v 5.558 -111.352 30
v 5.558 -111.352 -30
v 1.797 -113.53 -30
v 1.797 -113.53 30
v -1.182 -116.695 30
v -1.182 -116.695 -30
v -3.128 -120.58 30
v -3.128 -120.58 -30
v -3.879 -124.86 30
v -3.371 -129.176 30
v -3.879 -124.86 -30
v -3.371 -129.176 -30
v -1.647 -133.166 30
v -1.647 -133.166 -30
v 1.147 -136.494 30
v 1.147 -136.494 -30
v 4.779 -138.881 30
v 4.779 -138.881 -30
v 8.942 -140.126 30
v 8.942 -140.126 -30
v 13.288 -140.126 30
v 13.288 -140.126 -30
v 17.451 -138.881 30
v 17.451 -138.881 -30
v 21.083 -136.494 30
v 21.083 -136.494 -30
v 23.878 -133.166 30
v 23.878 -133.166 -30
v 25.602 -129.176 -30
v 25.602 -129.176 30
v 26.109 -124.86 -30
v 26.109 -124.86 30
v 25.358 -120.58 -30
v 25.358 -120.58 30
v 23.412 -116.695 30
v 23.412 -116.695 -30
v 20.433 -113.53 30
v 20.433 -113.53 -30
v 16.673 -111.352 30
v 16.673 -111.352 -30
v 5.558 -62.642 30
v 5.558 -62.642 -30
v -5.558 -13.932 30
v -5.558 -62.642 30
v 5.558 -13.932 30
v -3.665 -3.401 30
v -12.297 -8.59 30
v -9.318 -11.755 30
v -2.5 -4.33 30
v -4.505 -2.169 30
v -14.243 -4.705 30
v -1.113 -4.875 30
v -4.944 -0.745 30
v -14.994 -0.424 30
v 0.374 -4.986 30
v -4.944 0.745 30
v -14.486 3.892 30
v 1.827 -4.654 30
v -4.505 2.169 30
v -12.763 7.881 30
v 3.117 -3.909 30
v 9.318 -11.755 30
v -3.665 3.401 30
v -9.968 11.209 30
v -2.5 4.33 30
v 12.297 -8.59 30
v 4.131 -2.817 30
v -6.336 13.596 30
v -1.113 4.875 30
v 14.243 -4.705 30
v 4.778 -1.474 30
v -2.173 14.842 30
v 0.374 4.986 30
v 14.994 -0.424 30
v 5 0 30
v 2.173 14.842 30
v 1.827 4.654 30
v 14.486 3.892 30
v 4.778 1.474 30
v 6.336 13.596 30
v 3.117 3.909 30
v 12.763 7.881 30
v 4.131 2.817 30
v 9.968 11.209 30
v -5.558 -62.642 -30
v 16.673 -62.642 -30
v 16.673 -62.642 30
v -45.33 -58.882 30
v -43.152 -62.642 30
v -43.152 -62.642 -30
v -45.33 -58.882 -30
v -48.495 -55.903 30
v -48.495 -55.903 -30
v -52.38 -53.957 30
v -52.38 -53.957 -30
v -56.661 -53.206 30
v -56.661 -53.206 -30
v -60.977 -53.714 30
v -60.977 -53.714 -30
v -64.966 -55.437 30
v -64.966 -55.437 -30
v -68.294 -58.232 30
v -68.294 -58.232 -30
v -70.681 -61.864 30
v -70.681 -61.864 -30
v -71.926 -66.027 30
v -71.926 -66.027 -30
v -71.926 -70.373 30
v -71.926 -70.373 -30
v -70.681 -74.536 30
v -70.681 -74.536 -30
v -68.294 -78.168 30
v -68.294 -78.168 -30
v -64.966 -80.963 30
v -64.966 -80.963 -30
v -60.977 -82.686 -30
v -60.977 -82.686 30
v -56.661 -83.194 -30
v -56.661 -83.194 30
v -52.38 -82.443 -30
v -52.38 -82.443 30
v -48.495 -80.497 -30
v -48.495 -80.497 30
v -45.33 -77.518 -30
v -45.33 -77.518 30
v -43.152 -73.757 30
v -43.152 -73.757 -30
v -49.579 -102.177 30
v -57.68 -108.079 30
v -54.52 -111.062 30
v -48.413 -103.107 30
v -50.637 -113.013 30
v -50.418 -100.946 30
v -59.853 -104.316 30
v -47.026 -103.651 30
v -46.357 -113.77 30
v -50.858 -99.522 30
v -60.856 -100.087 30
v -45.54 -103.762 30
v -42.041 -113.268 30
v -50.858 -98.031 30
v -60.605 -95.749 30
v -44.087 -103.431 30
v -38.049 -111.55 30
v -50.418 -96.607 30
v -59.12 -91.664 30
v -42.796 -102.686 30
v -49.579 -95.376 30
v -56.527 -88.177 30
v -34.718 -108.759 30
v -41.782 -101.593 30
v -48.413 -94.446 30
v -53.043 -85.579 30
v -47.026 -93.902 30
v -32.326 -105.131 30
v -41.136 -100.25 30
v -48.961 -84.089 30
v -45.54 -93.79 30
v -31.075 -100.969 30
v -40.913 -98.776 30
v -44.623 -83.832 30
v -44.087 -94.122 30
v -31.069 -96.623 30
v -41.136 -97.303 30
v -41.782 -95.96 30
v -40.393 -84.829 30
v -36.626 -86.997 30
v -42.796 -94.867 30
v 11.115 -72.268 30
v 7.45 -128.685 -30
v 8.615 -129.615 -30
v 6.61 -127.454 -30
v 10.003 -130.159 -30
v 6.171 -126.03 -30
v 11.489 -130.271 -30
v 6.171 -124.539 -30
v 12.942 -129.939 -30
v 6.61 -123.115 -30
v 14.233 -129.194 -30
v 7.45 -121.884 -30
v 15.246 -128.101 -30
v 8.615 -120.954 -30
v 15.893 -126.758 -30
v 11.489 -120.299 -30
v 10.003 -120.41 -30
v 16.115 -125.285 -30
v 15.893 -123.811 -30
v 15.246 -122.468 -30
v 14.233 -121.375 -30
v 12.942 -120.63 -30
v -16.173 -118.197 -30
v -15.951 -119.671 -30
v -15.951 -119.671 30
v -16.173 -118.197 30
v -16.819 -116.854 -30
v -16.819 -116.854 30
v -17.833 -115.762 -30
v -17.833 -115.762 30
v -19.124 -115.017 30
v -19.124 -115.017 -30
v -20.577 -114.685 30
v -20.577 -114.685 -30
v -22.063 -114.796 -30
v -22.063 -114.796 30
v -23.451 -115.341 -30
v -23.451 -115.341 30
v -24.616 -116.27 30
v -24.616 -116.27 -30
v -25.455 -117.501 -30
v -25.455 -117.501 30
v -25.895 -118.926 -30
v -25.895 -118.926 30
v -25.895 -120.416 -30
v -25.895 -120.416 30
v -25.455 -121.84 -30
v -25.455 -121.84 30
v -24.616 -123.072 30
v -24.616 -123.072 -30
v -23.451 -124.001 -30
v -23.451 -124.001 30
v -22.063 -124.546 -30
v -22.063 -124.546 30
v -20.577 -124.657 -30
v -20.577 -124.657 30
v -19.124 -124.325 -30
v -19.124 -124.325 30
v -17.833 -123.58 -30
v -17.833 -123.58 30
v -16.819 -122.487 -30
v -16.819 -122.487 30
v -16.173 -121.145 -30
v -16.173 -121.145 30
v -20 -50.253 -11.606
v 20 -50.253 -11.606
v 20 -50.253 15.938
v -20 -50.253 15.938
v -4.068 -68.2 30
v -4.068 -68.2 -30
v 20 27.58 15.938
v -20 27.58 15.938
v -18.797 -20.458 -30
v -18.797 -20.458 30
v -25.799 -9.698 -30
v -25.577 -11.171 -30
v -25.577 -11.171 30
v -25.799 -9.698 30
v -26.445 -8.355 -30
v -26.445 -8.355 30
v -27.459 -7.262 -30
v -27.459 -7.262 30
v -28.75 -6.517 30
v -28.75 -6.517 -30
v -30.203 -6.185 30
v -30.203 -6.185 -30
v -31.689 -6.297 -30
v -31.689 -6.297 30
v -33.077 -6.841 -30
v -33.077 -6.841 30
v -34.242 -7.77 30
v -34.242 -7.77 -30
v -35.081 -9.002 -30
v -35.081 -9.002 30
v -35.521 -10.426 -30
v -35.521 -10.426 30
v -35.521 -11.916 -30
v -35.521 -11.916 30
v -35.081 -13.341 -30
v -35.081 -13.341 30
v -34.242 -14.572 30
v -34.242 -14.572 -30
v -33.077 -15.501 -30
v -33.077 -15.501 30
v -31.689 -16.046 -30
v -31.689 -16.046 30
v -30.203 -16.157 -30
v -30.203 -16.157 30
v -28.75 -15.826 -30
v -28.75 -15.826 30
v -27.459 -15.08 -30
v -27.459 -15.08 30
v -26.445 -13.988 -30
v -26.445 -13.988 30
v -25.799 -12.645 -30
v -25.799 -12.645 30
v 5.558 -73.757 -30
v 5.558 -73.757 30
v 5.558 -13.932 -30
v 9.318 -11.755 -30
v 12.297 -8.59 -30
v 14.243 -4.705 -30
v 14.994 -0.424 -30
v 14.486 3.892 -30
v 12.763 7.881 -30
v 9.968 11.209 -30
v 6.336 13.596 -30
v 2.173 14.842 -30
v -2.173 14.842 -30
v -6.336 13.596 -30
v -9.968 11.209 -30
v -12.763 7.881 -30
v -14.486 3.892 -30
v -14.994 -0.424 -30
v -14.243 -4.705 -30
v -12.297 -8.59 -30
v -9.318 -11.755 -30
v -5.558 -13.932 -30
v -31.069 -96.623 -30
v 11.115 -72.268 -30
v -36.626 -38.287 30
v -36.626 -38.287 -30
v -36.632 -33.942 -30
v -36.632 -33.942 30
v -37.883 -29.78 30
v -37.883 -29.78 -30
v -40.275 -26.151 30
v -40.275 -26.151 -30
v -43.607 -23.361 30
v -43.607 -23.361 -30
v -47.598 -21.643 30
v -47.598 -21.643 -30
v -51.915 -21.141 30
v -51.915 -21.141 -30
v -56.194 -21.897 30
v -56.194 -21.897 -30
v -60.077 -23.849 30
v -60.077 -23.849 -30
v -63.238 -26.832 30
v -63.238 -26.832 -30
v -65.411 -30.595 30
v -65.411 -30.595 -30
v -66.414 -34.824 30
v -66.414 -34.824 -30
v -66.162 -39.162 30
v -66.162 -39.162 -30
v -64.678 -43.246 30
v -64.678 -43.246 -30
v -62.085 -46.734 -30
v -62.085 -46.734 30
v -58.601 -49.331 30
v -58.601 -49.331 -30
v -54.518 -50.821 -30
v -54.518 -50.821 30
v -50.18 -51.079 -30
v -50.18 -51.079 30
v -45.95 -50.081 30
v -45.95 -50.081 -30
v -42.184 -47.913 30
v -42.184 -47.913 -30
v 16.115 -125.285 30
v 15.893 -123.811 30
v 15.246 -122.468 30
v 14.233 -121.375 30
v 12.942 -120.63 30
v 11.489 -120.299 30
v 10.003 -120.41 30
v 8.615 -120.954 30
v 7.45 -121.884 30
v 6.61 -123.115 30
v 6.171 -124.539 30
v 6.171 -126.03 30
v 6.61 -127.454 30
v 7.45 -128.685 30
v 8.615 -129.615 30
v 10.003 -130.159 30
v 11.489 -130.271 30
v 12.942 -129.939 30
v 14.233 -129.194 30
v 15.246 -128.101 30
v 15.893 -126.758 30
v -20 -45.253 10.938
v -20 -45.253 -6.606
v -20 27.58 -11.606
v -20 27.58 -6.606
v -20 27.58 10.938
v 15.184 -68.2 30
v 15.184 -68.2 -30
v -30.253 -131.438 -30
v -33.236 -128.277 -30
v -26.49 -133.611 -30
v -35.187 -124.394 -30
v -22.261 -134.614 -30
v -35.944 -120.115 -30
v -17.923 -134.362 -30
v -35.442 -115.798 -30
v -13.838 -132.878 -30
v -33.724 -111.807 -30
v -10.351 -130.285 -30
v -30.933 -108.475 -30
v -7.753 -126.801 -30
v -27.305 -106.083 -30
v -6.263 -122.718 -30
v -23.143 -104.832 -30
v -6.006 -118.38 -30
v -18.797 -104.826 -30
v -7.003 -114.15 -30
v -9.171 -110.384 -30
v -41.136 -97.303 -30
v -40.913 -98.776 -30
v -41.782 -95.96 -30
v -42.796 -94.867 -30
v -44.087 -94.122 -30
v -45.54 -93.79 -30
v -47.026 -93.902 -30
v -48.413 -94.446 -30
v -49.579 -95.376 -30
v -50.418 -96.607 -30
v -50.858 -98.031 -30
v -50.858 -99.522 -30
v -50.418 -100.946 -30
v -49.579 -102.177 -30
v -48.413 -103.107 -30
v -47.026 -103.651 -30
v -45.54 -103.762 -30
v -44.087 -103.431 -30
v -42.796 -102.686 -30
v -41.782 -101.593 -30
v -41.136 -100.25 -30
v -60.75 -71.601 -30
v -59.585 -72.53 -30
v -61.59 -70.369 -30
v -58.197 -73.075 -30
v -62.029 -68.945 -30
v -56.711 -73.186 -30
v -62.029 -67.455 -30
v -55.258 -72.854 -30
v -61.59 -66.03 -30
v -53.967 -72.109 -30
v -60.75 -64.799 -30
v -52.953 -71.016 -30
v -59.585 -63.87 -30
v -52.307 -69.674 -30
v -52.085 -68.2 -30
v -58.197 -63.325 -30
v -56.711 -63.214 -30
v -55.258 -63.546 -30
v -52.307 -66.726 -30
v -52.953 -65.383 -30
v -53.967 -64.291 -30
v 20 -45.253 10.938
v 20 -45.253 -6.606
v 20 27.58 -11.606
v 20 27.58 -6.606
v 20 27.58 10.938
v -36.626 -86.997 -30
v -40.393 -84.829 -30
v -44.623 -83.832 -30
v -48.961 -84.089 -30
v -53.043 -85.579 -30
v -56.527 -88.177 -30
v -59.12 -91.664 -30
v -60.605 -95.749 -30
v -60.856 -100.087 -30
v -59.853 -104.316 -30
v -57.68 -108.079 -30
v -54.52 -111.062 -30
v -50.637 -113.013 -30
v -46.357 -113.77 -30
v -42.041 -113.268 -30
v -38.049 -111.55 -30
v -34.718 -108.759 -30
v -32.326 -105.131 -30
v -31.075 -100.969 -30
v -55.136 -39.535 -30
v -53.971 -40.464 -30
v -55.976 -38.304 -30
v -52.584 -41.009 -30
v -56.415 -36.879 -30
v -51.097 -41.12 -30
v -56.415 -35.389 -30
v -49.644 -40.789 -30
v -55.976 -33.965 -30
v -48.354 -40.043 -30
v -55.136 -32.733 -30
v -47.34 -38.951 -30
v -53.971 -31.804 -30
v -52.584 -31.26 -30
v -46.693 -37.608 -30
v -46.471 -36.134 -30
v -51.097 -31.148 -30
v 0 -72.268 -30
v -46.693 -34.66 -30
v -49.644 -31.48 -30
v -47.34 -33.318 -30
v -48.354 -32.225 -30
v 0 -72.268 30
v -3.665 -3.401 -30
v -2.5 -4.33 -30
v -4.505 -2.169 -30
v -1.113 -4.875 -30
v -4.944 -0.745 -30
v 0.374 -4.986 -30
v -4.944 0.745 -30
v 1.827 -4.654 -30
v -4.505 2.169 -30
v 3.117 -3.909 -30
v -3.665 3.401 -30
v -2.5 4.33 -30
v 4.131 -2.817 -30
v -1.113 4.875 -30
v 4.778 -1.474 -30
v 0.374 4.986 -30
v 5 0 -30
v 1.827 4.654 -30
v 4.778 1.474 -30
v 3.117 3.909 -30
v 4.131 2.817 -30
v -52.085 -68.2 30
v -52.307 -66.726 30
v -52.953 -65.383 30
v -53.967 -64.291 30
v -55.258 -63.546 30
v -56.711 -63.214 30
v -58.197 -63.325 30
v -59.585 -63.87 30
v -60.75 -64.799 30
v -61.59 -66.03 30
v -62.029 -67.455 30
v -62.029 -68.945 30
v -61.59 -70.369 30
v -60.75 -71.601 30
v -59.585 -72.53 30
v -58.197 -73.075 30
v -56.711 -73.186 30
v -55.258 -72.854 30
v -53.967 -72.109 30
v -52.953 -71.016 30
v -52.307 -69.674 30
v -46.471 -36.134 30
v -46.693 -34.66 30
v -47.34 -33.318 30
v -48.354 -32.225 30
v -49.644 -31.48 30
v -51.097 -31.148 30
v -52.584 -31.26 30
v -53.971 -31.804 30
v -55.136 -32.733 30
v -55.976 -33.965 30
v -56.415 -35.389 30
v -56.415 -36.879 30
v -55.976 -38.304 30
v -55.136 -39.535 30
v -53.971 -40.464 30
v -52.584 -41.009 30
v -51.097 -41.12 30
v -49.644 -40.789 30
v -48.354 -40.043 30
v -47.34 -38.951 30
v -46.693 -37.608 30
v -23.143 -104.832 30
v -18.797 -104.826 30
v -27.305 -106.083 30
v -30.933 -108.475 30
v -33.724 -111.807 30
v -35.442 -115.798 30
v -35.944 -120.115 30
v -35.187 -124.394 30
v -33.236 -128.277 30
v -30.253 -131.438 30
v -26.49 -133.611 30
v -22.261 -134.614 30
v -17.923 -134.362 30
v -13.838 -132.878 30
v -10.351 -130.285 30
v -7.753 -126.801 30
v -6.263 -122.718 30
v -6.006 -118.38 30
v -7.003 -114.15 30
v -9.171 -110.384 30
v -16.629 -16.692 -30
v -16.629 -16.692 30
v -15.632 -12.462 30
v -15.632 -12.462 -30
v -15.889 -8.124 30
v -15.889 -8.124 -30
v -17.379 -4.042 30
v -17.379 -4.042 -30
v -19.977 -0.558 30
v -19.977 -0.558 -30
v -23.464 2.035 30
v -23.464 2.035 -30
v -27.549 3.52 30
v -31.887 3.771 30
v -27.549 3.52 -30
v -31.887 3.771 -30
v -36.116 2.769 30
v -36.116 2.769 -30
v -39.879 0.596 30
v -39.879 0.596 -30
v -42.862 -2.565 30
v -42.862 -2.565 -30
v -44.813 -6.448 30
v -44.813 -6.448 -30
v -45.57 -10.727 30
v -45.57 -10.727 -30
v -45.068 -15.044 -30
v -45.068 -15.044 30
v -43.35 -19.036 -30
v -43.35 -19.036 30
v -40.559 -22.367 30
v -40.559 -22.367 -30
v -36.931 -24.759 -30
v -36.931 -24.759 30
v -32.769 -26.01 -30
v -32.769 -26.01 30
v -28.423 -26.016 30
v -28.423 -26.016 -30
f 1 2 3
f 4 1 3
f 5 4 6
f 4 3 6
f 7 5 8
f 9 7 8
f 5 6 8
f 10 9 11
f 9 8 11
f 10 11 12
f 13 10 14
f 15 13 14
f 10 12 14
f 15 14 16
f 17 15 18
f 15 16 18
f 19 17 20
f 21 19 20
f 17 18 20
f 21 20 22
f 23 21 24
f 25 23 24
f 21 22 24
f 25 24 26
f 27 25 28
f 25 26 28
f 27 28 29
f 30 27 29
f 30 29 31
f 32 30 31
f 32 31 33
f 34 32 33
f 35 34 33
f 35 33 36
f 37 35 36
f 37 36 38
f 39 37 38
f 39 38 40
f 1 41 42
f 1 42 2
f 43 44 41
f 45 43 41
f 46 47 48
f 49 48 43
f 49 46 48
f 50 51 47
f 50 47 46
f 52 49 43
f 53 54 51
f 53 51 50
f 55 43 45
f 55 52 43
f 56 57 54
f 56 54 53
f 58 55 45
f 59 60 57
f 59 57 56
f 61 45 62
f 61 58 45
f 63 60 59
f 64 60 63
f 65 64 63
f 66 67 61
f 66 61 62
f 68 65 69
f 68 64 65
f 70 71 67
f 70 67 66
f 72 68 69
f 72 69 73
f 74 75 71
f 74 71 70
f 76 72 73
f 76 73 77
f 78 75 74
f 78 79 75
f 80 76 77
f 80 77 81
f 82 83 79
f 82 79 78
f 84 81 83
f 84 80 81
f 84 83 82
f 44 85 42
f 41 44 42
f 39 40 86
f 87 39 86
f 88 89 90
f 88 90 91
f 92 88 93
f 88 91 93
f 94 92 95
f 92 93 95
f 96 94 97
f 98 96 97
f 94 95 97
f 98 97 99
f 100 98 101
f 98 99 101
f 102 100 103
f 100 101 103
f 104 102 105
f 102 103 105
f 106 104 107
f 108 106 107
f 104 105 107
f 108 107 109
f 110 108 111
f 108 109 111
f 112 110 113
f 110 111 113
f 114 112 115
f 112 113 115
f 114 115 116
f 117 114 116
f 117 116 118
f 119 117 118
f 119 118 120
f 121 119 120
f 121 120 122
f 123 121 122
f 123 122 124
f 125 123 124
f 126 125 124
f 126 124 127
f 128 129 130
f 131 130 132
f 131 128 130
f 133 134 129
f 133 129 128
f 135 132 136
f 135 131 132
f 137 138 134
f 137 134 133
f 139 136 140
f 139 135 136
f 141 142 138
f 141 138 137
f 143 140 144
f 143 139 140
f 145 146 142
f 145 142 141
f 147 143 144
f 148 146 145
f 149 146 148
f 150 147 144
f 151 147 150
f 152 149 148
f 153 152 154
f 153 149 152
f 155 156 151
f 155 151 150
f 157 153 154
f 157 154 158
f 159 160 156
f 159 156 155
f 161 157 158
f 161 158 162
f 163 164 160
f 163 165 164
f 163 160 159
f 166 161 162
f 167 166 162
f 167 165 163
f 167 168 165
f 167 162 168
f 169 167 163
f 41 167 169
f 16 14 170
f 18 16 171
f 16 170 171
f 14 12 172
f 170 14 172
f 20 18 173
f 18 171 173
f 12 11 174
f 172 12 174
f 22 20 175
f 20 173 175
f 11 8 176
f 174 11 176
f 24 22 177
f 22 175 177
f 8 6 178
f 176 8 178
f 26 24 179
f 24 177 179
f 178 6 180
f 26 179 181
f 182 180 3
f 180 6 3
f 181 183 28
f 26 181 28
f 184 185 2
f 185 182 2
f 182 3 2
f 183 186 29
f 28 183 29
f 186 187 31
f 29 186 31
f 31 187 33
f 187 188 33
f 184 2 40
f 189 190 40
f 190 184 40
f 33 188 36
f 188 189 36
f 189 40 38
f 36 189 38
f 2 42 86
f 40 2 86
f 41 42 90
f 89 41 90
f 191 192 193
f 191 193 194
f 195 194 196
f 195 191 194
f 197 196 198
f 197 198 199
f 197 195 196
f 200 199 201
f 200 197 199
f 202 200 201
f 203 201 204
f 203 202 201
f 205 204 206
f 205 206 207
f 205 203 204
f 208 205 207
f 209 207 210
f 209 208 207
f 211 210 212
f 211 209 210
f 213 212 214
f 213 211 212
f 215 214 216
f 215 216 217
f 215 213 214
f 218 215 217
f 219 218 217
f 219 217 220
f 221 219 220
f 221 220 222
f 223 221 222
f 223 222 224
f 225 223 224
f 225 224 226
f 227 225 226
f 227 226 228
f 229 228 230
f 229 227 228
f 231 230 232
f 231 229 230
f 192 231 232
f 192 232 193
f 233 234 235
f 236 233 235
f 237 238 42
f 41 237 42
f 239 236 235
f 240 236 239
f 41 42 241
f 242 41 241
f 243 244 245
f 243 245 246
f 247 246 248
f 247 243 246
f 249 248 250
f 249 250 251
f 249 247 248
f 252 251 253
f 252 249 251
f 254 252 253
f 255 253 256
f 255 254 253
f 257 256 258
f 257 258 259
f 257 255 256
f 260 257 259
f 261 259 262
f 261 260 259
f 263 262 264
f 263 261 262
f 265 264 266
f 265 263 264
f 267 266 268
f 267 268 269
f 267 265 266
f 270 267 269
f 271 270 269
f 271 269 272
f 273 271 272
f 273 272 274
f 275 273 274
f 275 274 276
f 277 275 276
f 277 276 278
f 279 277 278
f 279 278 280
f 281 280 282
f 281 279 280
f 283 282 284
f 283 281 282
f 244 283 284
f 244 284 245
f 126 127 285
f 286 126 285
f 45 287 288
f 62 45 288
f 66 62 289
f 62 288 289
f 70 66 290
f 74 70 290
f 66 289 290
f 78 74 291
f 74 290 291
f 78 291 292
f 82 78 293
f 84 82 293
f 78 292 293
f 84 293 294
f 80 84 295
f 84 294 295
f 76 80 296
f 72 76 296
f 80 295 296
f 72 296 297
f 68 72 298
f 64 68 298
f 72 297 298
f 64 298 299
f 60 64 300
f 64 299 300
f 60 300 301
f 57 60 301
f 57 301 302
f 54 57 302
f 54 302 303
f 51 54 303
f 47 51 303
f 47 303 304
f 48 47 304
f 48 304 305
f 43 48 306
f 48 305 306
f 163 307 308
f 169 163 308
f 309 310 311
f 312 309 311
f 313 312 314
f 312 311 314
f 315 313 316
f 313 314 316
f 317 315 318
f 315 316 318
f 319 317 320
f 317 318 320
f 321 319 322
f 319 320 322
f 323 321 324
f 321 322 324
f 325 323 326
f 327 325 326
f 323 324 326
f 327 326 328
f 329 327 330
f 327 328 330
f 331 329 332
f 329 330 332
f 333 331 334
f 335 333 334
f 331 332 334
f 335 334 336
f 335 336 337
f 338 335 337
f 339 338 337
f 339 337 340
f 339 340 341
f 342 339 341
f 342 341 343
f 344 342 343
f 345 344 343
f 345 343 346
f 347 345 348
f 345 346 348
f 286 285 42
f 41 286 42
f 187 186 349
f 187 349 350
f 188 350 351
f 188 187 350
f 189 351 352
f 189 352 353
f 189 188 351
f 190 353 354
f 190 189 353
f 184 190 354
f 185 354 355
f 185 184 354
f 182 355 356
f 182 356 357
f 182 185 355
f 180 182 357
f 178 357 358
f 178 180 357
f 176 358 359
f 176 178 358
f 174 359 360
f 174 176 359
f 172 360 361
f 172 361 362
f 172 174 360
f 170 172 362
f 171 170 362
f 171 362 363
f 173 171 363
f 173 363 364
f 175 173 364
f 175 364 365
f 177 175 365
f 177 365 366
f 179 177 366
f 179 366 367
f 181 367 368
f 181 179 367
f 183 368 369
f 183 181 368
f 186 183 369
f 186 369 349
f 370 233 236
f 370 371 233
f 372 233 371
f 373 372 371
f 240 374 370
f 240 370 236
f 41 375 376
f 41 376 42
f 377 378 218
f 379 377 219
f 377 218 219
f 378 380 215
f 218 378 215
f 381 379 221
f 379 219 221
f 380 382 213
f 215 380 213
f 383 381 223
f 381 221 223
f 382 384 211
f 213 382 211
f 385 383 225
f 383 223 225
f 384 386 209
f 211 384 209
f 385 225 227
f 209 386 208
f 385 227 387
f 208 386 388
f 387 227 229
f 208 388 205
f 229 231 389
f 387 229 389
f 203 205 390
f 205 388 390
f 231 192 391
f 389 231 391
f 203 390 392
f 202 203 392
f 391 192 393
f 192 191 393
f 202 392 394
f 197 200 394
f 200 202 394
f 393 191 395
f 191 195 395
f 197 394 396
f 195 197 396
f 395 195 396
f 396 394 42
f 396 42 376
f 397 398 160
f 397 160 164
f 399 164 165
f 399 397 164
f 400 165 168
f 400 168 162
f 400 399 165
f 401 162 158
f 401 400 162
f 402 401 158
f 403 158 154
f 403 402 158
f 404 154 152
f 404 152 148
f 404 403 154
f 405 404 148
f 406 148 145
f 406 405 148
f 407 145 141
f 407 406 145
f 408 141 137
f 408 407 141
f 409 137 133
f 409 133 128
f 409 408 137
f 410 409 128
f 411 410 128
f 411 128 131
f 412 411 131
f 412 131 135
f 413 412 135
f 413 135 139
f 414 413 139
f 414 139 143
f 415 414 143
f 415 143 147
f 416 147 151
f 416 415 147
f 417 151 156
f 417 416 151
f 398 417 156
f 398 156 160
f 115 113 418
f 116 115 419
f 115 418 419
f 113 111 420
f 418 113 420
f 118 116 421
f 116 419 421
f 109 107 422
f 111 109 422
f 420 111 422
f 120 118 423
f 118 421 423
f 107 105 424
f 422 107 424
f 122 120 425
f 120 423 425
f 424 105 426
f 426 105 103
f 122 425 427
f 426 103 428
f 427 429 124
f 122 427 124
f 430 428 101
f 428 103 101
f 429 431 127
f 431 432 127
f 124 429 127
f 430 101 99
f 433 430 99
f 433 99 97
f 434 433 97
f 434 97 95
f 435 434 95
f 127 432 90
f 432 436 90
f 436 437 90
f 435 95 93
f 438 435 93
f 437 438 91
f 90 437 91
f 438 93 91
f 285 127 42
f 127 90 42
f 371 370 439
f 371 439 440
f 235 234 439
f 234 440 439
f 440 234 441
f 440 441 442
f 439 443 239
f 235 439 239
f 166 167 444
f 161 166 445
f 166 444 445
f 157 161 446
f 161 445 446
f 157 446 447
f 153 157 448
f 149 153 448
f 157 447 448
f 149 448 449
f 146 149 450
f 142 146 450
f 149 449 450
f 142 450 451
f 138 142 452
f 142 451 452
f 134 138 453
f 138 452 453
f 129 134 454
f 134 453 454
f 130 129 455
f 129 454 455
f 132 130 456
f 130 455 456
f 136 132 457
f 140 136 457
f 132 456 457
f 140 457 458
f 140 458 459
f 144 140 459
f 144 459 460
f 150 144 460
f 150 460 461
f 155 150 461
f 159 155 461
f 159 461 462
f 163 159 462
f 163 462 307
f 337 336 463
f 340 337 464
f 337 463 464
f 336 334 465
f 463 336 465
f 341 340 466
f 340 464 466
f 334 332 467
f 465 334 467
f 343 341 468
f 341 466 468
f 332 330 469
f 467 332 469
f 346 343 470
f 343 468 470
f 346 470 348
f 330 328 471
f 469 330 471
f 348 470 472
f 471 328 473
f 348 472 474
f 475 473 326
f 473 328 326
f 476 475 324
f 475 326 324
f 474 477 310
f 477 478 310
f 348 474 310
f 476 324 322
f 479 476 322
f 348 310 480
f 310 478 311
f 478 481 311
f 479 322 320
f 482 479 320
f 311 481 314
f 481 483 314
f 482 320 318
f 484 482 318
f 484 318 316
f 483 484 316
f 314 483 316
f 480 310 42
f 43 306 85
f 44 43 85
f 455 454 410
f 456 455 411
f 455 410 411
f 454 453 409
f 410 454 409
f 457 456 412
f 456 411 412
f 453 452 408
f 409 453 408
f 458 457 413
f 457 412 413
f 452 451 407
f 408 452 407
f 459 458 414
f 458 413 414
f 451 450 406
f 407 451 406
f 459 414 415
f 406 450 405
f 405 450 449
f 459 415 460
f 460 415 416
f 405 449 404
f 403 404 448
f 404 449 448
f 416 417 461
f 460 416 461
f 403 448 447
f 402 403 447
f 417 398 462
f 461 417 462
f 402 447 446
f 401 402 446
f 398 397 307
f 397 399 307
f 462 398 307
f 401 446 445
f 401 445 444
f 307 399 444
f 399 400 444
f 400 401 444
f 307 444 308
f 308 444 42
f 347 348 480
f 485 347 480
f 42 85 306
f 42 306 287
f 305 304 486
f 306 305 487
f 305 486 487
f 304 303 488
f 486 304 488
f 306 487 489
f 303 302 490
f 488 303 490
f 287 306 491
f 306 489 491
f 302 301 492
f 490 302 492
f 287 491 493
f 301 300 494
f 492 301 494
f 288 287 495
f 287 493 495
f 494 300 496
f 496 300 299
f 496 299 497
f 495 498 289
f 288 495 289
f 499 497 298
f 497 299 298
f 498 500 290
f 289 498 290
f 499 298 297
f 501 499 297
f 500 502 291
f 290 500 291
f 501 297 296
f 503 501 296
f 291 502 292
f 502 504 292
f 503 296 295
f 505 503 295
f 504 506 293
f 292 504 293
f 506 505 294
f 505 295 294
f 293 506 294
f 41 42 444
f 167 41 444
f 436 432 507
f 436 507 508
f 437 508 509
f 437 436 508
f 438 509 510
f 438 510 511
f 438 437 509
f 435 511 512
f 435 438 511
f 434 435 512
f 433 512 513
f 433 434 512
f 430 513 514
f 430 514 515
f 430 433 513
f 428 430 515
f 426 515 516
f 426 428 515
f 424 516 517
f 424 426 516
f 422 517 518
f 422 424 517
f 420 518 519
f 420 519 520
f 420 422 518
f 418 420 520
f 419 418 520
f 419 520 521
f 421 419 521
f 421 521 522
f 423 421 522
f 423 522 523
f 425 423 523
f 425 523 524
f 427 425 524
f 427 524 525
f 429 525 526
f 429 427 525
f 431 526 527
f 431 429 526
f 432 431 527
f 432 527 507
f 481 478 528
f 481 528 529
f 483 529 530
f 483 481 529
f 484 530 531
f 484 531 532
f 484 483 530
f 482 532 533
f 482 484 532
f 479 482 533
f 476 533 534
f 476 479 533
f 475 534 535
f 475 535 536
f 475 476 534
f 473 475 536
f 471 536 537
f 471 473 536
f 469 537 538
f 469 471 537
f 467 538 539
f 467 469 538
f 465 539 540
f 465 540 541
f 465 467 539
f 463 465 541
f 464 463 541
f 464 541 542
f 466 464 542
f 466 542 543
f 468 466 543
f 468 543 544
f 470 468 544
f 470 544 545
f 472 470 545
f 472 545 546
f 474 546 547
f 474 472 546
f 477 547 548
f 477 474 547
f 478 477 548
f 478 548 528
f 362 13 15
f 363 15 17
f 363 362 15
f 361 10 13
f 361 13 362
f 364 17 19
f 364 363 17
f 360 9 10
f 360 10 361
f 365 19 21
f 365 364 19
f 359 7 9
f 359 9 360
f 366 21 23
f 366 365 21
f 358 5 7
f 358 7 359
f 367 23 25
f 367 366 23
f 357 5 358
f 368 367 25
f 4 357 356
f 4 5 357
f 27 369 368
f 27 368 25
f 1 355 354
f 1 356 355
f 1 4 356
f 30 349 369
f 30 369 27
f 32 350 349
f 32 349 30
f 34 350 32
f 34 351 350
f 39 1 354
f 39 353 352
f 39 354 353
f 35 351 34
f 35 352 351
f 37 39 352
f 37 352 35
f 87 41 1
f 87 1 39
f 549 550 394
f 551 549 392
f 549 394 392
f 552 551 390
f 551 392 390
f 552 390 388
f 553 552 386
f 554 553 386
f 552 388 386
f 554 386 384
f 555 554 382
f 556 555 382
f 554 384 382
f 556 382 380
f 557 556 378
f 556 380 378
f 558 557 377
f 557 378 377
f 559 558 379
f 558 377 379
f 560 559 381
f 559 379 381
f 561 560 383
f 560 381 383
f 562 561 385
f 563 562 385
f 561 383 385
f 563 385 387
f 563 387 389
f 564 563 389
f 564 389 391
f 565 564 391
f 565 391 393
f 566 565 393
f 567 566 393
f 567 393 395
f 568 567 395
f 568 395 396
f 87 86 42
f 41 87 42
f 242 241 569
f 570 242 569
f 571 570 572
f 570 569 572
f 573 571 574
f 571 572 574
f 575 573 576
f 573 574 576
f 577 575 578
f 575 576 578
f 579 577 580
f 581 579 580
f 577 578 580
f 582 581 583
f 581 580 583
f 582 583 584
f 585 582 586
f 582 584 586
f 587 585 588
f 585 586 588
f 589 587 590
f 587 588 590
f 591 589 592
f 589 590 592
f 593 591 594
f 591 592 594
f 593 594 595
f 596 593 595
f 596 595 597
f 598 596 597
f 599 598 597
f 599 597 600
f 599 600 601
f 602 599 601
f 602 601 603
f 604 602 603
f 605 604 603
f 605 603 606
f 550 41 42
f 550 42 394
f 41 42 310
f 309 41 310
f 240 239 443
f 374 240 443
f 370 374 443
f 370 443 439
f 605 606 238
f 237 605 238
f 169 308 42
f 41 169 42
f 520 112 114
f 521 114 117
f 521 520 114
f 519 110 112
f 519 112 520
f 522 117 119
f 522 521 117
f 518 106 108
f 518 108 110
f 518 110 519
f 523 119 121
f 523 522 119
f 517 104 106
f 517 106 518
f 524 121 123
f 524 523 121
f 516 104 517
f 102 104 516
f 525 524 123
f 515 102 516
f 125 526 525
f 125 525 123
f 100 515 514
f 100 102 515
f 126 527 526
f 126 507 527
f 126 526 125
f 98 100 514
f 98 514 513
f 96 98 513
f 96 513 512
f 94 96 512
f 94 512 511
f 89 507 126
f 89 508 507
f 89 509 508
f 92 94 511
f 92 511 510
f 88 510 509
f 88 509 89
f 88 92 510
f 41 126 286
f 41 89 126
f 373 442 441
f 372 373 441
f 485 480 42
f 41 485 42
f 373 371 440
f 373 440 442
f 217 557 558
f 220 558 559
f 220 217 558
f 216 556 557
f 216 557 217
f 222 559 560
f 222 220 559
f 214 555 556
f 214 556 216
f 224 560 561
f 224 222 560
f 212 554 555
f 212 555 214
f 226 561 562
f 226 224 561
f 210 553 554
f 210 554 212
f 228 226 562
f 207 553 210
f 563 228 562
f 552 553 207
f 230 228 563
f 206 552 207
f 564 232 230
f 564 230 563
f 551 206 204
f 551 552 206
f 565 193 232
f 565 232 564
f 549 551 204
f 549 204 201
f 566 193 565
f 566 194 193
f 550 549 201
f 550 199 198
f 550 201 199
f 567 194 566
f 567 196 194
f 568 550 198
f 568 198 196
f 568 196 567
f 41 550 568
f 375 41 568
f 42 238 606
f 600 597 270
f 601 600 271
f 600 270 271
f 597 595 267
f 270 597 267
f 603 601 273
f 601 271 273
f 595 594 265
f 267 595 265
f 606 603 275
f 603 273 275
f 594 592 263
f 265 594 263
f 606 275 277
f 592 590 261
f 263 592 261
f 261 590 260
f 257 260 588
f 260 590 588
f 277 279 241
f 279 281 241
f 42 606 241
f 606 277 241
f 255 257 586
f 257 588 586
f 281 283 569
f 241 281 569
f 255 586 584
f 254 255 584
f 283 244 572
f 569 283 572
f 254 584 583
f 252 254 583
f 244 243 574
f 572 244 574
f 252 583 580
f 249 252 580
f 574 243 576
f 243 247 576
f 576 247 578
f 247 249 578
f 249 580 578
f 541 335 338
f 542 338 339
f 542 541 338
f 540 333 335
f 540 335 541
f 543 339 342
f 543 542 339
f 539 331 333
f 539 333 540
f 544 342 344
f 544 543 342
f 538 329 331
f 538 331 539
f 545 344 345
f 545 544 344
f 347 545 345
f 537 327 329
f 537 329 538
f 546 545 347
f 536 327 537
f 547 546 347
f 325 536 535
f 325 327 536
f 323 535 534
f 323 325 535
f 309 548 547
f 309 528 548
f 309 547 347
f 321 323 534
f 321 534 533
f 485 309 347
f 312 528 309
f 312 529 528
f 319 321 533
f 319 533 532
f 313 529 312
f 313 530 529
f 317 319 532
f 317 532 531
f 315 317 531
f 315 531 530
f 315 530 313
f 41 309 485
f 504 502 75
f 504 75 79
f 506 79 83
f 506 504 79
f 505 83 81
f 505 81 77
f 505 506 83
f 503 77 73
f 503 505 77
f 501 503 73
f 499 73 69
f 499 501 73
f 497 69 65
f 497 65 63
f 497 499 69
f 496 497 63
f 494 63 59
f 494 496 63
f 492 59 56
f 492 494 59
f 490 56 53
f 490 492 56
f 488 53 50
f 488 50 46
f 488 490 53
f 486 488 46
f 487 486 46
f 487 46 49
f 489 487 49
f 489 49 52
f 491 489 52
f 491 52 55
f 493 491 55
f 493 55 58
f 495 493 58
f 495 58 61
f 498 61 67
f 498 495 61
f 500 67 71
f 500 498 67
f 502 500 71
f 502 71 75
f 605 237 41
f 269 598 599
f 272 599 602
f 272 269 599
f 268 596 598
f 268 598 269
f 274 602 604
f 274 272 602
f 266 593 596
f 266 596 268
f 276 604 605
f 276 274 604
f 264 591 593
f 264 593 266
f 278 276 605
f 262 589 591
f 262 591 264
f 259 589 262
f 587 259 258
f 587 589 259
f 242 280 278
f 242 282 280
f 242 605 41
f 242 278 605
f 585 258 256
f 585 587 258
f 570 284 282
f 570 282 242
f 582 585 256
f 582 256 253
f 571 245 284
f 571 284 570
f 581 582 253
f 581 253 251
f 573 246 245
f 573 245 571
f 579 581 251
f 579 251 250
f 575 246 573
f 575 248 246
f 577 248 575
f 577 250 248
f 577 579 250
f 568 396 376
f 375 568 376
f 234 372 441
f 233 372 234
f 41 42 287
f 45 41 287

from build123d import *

# Parameters (mm, degrees)
EXTRUDE_5_DEPTH         = 30
EXTRUDE_5_DEPTH_BACK    = 30
F_1_FR_R                = 5
EXTRUDE_6_DEPTH         = 20
EXTRUDE_6_DEPTH_BACK    = 20
MOVE_START              = -30
MOVE_BODY_2_OUTLINE_R   = 5
MOVE_BODY_2_DEPTH       = 60
MOVE_BODY_2_2_OUTLINE_R = 5
MOVE_BODY_2_2_DEPTH     = 60
MOVE_BODY_2_3_OUTLINE_R = 5
MOVE_BODY_2_3_DEPTH     = 60
MOVE_BODY_2_4_OUTLINE_R = 5
MOVE_BODY_2_4_DEPTH     = 60
MOVE_BODY_2_5_OUTLINE_R = 5
MOVE_BODY_2_5_DEPTH     = 60
MOVE_BODY_2_6_OUTLINE_R = 5
MOVE_BODY_2_6_DEPTH     = 60


# Read off the part's stored shape, not the designer's step: Тело-Переместить/Копировать2
with BuildPart() as part:
    # Эскиз1_fr → Бобышка-Вытянуть5 (new, two sides: drawn at the far end of the back side and taken through both)
    with BuildSketch(Plane.XY.offset(-EXTRUDE_5_DEPTH_BACK)):
        with BuildLine():
            Line((-5.557606452, -13.932444528), (-5.557606452, -62.642280008))
            Line((-5.557606452, -62.642280008), (5.557606452, -62.642280008))
            Line((5.557606452, -62.642280008), (5.557606452, -13.932444528))
            ThreePointArc((5.557606452, -13.932444528), (0, 15), (-5.557606452, -13.932444528))
        make_face()
        Circle(F_1_FR_R, mode=Mode.SUBTRACT)
    extrude(amount=EXTRUDE_5_DEPTH + EXTRUDE_5_DEPTH_BACK)


with BuildPart() as body_2:
    # Эскиз3 → Бобышка-Вытянуть6 (new, two sides: drawn at the far end of the back side and taken through both)
    with BuildSketch(Plane(origin=(0, 0, 0), x_dir=(0, 0, -1), z_dir=(1, 0, 0)).offset(-EXTRUDE_6_DEPTH_BACK)):
        Polygon((-58.394498043, -50.25314581), (-85.938130262, -50.25314581), (-85.938130262, 27.580465306), (-80.938130262, 27.580465306), (-80.938130262, -45.25314581), (-63.394498043, -45.25314581), (-63.394498043, 27.580465306), (-58.394498043, 27.580465306), align=None)
    extrude(amount=EXTRUDE_6_DEPTH + EXTRUDE_6_DEPTH_BACK)


with BuildPart() as body_2_1:
    # Move Body 1: moved
    add(body_2.part.moved(Location((0, 0, -70))))


with BuildPart() as body_3:
    # Move Body 2 outline → Move Body 2 (new body)
    with BuildSketch(Plane.XY.offset(MOVE_START)):
        with BuildLine():
            Line((5.557606452, -62.642280008), (5.557606452, -111.352115487))
            ThreePointArc((5.557606452, -111.352115487), (11.115212904, -140.284560015), (16.672819356, -111.352115487))
            Line((16.672819356, -111.352115487), (16.672819356, -62.642280008))
            Line((16.672819356, -62.642280008), (5.557606452, -62.642280008))
        make_face()
        with Locations((11.115212904, -125.284560015)):
            Circle(MOVE_BODY_2_OUTLINE_R, mode=Mode.SUBTRACT)
    extrude(amount=MOVE_BODY_2_DEPTH)


with BuildPart() as body_4:
    # Move Body 2 2 outline → Move Body 2 2 (new body)
    with BuildSketch(Plane.XY.offset(MOVE_START)):
        with BuildLine():
            Line((5.557606452, -62.642280008), (-18.797311288, -104.826234947))
            ThreePointArc((-18.797311288, -104.826234947), (-28.450505179, -132.661270128), (-9.171254544, -110.383841399))
            Line((-9.171254544, -110.383841399), (15.183663196, -68.19988646))
            Line((15.183663196, -68.19988646), (5.557606452, -62.642280008))
        make_face()
        with Locations((-20.95050518, -119.670889071)):
            Circle(MOVE_BODY_2_2_OUTLINE_R, mode=Mode.SUBTRACT)
    extrude(amount=MOVE_BODY_2_2_DEPTH)


with BuildPart() as body_5:
    # Move Body 2 3 outline → Move Body 2 3 (new body)
    with BuildSketch(Plane.XY.offset(MOVE_START)):
        with BuildLine():
            Line((5.557606452, -62.642280008), (-36.626348487, -86.997197747))
            ThreePointArc((-36.626348487, -86.997197747), (-58.903777216, -106.276448382), (-31.068742035, -96.623254491))
            Line((-31.068742035, -96.623254491), (11.115212904, -72.268336751))
            Line((11.115212904, -72.268336751), (5.557606452, -62.642280008))
        make_face()
        with Locations((-45.913396159, -98.776448383)):
            Circle(MOVE_BODY_2_3_OUTLINE_R, mode=Mode.SUBTRACT)
    extrude(amount=MOVE_BODY_2_3_DEPTH)


with BuildPart() as body_6:
    # Move Body 2 4 outline → Move Body 2 4 (new body)
    with BuildSketch(Plane.XY.offset(MOVE_START)):
        with BuildLine():
            Line((5.557606452, -62.642280008), (-43.152229028, -62.642280008))
            ThreePointArc((-43.152229028, -62.642280008), (-72.084673555, -68.19988646), (-43.152229028, -73.757492912))
            Line((-43.152229028, -73.757492912), (5.557606452, -73.757492912))
            Line((5.557606452, -73.757492912), (5.557606452, -62.642280008))
        make_face()
        with Locations((-57.084673555, -68.19988646)):
            Circle(MOVE_BODY_2_4_OUTLINE_R, mode=Mode.SUBTRACT)
    extrude(amount=MOVE_BODY_2_4_DEPTH)


with BuildPart() as body_7:
    # Move Body 2 5 outline → Move Body 2 5 (new body)
    with BuildSketch(Plane.XY.offset(MOVE_START)):
        with BuildLine():
            Line((5.557606452, -62.642280008), (-36.626348487, -38.287362268))
            ThreePointArc((-36.626348487, -38.287362268), (-64.461383667, -28.634168373), (-42.18395494, -47.913419011))
            Line((-42.18395494, -47.913419011), (0, -72.268336751))
            Line((0, -72.268336751), (5.557606452, -62.642280008))
        make_face()
        with Locations((-51.471002611, -36.134168376)):
            Circle(MOVE_BODY_2_5_OUTLINE_R, mode=Mode.SUBTRACT)
    extrude(amount=MOVE_BODY_2_5_DEPTH)


with BuildPart() as body_8:
    # Move Body 2 6 outline → Move Body 2 6 (new body)
    with BuildSketch(Plane.XY.offset(MOVE_START)):
        with BuildLine():
            Line((5.557606452, -62.642280008), (-18.797311288, -20.458325068))
            ThreePointArc((-18.797311288, -20.458325068), (-38.076561924, 1.819103661), (-28.423368031, -26.01593152))
            Line((-28.423368031, -26.01593152), (-4.068450291, -68.19988646))
            Line((-4.068450291, -68.19988646), (5.557606452, -62.642280008))
        make_face()
        with Locations((-30.576561923, -11.171277396)):
            Circle(MOVE_BODY_2_6_OUTLINE_R, mode=Mode.SUBTRACT)
    extrude(amount=MOVE_BODY_2_6_DEPTH)


solid = Compound([part.part, body_2_1.part, body_3.part, body_4.part, body_5.part, body_6.part, body_7.part, body_8.part])
